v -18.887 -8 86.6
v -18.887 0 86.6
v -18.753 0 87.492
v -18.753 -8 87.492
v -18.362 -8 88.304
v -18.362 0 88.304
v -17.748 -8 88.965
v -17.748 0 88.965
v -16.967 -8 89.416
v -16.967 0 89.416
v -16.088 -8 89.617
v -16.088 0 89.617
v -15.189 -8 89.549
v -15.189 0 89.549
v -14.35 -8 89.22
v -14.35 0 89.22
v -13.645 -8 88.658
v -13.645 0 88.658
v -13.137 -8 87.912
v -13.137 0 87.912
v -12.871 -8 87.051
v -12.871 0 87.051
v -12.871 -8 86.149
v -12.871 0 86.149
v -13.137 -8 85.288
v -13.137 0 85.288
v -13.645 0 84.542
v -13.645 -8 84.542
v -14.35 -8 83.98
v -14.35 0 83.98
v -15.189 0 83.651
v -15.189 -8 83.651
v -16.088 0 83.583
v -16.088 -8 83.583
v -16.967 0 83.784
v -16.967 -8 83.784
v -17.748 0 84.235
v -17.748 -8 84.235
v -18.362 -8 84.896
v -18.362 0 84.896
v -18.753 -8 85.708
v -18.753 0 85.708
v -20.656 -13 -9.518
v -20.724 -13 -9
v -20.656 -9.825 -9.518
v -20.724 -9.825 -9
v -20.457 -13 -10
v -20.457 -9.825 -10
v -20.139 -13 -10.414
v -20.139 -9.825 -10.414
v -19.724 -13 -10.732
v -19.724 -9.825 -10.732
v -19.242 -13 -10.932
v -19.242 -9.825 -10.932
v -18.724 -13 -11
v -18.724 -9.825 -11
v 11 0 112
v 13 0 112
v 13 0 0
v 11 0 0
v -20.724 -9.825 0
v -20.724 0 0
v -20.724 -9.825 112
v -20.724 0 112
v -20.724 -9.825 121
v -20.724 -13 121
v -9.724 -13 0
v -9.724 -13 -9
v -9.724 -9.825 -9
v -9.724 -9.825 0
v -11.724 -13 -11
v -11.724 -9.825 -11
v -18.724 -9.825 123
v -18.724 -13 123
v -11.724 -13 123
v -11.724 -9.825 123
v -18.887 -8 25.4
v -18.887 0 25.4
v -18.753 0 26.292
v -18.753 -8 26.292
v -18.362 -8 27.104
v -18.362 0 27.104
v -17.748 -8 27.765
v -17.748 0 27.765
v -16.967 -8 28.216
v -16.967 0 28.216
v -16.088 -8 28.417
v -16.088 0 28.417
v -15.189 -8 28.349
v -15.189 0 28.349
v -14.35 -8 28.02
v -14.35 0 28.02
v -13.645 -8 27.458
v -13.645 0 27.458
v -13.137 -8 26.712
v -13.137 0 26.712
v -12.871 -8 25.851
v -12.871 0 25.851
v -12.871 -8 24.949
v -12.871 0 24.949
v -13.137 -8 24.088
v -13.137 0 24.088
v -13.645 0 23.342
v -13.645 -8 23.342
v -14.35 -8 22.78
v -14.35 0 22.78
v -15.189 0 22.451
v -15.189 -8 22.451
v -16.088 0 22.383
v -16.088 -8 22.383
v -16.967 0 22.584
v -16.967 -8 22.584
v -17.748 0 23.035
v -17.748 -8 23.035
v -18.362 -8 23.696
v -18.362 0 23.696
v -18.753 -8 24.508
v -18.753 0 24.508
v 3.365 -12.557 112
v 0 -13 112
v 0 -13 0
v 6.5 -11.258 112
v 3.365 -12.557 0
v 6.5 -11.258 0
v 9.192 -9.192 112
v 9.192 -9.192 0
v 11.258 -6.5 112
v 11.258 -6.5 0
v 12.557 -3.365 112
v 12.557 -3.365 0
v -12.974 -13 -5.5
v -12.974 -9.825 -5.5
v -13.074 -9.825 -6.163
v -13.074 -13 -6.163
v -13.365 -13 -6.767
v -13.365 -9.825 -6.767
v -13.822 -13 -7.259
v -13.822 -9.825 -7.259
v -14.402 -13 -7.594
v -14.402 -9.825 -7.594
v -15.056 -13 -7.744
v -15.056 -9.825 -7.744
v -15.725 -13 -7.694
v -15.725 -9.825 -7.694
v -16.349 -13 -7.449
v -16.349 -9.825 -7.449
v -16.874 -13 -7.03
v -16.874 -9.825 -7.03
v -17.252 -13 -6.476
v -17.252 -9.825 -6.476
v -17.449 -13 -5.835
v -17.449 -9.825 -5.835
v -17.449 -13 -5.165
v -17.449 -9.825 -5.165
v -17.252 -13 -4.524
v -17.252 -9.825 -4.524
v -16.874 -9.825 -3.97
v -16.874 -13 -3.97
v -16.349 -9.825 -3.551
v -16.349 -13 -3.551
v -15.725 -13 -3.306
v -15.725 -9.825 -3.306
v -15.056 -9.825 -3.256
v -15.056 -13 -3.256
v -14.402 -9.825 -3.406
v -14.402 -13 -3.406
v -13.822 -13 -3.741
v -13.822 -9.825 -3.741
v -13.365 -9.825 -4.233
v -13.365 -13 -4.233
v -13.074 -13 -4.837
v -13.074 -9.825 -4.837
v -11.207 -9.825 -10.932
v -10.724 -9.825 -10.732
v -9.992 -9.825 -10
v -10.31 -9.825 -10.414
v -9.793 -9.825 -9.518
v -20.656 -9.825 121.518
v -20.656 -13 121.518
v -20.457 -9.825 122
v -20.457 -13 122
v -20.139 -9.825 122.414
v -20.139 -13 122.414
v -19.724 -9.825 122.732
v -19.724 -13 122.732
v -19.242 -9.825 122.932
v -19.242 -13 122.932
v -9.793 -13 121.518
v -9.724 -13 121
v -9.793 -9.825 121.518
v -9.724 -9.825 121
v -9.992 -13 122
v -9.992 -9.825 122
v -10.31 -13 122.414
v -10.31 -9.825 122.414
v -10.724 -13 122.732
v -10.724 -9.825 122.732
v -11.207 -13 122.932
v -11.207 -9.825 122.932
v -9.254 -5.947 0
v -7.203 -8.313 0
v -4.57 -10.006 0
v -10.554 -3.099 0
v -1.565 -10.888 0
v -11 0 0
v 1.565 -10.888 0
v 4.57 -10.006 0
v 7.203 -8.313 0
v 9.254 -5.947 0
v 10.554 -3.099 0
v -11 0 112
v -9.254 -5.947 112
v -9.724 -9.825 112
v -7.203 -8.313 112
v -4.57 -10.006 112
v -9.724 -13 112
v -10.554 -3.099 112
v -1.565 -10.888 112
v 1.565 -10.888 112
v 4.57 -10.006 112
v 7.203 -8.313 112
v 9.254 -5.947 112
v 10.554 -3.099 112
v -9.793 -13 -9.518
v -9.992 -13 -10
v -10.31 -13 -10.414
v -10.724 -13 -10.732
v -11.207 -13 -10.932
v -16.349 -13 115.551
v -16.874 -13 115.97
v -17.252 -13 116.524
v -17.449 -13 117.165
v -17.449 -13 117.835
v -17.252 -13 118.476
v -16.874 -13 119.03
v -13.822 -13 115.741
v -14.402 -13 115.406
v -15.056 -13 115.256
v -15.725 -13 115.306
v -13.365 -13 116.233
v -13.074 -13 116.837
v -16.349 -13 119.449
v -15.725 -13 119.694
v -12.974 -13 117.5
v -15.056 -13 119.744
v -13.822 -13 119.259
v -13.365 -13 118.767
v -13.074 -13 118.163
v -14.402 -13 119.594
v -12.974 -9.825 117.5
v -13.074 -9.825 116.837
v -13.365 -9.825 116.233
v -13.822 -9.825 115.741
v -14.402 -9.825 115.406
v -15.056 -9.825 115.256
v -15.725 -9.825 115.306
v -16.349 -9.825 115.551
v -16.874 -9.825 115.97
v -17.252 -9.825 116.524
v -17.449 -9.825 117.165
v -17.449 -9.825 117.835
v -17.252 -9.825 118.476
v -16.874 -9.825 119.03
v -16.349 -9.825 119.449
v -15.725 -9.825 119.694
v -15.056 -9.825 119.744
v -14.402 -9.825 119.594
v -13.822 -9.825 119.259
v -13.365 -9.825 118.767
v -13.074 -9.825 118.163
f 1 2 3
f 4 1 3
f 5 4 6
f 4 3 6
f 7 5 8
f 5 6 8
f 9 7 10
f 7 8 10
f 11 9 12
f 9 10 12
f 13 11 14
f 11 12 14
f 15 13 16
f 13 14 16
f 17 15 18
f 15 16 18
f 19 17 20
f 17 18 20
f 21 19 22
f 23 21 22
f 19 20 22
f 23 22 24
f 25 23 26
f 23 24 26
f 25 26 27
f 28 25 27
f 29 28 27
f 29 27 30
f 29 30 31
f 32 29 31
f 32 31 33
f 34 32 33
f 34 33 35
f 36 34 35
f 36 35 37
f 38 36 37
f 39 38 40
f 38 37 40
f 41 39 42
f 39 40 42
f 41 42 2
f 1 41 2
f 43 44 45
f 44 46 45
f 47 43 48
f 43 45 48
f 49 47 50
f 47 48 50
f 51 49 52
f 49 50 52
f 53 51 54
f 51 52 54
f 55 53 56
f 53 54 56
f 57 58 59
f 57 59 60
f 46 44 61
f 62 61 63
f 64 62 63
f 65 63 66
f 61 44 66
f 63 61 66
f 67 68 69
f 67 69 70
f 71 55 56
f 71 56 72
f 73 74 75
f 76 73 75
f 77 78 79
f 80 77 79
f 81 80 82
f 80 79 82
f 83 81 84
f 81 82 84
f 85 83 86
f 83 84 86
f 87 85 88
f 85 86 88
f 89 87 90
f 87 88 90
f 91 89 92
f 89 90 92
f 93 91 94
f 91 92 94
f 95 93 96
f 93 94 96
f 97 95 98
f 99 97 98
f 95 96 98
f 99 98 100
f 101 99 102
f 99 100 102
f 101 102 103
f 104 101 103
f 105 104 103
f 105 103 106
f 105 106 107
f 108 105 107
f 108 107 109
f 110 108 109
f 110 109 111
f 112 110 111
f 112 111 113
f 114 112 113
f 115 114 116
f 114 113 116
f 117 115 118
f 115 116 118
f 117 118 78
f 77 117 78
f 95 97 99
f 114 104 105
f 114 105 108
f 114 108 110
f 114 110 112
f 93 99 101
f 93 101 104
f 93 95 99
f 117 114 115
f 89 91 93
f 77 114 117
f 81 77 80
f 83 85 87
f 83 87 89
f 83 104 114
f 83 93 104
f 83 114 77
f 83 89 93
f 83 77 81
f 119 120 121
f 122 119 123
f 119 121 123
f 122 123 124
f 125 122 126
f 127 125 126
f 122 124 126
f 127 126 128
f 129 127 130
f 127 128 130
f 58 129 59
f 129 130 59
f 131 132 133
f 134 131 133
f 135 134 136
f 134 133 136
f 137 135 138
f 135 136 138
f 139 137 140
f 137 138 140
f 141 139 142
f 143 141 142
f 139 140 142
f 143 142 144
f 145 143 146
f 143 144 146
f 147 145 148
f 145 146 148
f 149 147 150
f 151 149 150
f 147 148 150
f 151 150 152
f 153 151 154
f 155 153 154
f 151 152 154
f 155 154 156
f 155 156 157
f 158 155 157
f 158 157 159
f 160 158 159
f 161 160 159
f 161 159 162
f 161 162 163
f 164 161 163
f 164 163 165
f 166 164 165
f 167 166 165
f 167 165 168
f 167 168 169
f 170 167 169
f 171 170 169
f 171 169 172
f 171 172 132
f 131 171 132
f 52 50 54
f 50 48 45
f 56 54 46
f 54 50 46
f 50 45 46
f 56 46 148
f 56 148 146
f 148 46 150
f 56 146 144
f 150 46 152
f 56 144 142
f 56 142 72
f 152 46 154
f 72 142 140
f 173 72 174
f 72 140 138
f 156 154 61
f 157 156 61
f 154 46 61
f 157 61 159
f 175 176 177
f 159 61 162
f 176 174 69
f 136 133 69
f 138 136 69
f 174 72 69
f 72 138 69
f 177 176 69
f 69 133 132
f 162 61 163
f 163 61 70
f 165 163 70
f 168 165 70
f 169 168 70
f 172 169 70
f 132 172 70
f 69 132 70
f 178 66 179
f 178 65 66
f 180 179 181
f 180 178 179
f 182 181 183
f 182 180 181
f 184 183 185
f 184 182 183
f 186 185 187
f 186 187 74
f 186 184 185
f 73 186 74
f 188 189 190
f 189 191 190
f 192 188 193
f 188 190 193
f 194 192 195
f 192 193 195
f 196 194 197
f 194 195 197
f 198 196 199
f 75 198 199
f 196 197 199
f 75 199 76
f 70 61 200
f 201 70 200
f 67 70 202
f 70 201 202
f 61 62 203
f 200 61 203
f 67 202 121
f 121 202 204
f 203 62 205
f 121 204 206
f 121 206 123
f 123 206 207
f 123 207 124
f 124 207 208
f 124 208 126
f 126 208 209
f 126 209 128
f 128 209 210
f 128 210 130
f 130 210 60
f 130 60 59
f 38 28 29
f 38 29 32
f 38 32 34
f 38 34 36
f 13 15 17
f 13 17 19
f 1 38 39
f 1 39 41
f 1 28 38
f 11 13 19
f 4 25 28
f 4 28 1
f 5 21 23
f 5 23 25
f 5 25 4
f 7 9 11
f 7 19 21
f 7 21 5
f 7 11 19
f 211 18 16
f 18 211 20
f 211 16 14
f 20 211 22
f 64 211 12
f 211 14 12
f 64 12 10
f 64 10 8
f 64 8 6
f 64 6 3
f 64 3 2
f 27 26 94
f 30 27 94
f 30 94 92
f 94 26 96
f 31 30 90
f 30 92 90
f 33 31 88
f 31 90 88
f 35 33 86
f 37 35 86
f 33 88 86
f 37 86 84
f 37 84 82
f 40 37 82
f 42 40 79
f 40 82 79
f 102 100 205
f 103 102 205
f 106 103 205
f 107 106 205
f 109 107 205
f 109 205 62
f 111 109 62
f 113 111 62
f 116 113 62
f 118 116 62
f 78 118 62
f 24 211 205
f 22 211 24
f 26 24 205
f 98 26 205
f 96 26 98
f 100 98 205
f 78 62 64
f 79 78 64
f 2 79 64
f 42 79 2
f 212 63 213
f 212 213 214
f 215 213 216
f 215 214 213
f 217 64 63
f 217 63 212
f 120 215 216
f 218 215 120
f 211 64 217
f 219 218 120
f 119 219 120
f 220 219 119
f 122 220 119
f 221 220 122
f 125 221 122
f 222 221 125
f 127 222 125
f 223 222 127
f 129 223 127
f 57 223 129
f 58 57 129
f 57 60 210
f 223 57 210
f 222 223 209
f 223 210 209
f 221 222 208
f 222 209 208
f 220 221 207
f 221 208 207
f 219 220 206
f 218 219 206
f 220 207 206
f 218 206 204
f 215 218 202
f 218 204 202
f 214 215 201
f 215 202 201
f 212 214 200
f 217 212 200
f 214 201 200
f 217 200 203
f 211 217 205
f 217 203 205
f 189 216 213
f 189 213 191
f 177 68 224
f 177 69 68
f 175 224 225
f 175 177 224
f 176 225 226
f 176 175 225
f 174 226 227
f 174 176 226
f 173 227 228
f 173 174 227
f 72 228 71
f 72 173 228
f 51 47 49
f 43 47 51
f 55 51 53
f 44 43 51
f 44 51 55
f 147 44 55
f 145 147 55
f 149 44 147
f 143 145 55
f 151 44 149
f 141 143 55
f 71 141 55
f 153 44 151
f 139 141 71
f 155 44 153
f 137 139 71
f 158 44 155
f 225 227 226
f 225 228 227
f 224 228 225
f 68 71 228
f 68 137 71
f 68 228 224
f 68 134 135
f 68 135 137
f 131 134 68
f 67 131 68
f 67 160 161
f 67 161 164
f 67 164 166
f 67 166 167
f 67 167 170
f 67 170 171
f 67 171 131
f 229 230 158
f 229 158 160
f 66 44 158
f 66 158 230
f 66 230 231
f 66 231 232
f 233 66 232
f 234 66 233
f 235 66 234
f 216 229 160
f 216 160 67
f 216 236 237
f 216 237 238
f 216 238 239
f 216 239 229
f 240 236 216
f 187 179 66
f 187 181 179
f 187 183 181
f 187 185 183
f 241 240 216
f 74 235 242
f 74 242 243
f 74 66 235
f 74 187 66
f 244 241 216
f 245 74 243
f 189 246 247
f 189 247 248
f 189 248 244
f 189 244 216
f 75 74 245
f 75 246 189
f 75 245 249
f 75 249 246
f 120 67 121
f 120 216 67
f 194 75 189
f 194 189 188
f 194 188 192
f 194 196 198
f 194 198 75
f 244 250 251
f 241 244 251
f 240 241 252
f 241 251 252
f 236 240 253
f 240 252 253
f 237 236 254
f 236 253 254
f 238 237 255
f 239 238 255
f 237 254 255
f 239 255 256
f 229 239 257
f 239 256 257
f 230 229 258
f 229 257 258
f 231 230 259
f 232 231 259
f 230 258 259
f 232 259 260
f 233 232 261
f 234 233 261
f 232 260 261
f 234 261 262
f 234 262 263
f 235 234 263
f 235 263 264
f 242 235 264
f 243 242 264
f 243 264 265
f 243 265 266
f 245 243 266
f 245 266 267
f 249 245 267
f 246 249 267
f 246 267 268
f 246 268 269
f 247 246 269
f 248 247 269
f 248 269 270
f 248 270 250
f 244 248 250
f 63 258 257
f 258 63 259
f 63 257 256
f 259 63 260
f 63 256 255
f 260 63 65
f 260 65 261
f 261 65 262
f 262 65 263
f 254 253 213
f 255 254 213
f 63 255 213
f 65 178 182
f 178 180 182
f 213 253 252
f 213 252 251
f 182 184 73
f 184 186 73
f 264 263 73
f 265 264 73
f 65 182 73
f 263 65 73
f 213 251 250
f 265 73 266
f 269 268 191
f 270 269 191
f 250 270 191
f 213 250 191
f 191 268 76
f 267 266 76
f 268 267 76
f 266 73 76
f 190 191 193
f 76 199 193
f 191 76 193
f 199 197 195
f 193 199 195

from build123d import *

# Parameters (mm, degrees)
BOSS_EXTRUDE1_DEPTH  = 112
SKETCH2_R            = 3.025
CUT_EXTRUDE1_DEPTH   = 8
SKETCH3_W            = 11
SKETCH3_H            = 11
BOSS_EXTRUDE2_DEPTH  = 3.175
FILLET1_R            = 2
M4_CLEARANCE_HOLE1_D = 4.5


with BuildPart() as part:
    # Sketch1 → Boss-Extrude1 (new body)
    with BuildSketch(Plane.XY):
        with BuildLine():
            ThreePointArc((0, -13), (-9.192388155, -9.192388155), (-13, 0))
            Line((-13, 0), (-20.724457785, 0))
            Line((-20.724457785, 0), (-20.724457785, -13))
            Line((-20.724457785, -13), (0, -13))
        make_face()
        with BuildLine():
            Line((-11, 0), (-13, 0))
            ThreePointArc((-13, 0), (-9.192388155, -9.192388155), (0, -13))
            ThreePointArc((0, -13), (9.192388155, -9.192388155), (13, 0))
            Line((13, 0), (11, 0))
            ThreePointArc((11, 0), (0, -11), (-11, 0))
        make_face()
    extrude(amount=BOSS_EXTRUDE1_DEPTH)

    # Sketch2 → Cut-Extrude1 (cut)
    with BuildSketch(Plane(origin=(0, 0, 0), x_dir=(1, 0, 0), z_dir=(0, 1, 0))):
        with Locations(Location((-15.862228893, -25.4, 0), (0, 0, 180))):
            Circle(SKETCH2_R)
        with Locations(Location((-15.862228893, -86.6, 0), (0, 0, 180))):
            Circle(SKETCH2_R)
    extrude(amount=-CUT_EXTRUDE1_DEPTH, mode=Mode.SUBTRACT)

    # Sketch3 → Boss-Extrude2 (add)
    with BuildSketch(Plane.XZ.offset(13)):
        with Locations((-15.224457785, 117.5)):
            Rectangle(SKETCH3_W, SKETCH3_H)
        with Locations((-15.224457785, -5.5)):
            Rectangle(SKETCH3_W, SKETCH3_H)
    extrude(amount=-BOSS_EXTRUDE2_DEPTH)

    # Fillet1
    fillet1_edges = [part.edges().sort_by_distance(p)[0] for p in [
        (-20.724457785, -11.4125, 123),
        (-9.724457785, -11.4125, 123),
        (-20.724457785, -11.4125, -11),
        (-9.724457785, -11.4125, -11),
    ]]
    fillet(fillet1_edges, radius=FILLET1_R)

    # M4 Clearance Hole1 (through all)
    with Locations(Plane(origin=(0, -13, 0), x_dir=(-1, 0, 0), z_dir=(0, -1, 0))):
        with Locations((15.224457785, 5.5), (15.224457785, -117.5)):
            Hole(M4_CLEARANCE_HOLE1_D / 2)


solid = part.part
